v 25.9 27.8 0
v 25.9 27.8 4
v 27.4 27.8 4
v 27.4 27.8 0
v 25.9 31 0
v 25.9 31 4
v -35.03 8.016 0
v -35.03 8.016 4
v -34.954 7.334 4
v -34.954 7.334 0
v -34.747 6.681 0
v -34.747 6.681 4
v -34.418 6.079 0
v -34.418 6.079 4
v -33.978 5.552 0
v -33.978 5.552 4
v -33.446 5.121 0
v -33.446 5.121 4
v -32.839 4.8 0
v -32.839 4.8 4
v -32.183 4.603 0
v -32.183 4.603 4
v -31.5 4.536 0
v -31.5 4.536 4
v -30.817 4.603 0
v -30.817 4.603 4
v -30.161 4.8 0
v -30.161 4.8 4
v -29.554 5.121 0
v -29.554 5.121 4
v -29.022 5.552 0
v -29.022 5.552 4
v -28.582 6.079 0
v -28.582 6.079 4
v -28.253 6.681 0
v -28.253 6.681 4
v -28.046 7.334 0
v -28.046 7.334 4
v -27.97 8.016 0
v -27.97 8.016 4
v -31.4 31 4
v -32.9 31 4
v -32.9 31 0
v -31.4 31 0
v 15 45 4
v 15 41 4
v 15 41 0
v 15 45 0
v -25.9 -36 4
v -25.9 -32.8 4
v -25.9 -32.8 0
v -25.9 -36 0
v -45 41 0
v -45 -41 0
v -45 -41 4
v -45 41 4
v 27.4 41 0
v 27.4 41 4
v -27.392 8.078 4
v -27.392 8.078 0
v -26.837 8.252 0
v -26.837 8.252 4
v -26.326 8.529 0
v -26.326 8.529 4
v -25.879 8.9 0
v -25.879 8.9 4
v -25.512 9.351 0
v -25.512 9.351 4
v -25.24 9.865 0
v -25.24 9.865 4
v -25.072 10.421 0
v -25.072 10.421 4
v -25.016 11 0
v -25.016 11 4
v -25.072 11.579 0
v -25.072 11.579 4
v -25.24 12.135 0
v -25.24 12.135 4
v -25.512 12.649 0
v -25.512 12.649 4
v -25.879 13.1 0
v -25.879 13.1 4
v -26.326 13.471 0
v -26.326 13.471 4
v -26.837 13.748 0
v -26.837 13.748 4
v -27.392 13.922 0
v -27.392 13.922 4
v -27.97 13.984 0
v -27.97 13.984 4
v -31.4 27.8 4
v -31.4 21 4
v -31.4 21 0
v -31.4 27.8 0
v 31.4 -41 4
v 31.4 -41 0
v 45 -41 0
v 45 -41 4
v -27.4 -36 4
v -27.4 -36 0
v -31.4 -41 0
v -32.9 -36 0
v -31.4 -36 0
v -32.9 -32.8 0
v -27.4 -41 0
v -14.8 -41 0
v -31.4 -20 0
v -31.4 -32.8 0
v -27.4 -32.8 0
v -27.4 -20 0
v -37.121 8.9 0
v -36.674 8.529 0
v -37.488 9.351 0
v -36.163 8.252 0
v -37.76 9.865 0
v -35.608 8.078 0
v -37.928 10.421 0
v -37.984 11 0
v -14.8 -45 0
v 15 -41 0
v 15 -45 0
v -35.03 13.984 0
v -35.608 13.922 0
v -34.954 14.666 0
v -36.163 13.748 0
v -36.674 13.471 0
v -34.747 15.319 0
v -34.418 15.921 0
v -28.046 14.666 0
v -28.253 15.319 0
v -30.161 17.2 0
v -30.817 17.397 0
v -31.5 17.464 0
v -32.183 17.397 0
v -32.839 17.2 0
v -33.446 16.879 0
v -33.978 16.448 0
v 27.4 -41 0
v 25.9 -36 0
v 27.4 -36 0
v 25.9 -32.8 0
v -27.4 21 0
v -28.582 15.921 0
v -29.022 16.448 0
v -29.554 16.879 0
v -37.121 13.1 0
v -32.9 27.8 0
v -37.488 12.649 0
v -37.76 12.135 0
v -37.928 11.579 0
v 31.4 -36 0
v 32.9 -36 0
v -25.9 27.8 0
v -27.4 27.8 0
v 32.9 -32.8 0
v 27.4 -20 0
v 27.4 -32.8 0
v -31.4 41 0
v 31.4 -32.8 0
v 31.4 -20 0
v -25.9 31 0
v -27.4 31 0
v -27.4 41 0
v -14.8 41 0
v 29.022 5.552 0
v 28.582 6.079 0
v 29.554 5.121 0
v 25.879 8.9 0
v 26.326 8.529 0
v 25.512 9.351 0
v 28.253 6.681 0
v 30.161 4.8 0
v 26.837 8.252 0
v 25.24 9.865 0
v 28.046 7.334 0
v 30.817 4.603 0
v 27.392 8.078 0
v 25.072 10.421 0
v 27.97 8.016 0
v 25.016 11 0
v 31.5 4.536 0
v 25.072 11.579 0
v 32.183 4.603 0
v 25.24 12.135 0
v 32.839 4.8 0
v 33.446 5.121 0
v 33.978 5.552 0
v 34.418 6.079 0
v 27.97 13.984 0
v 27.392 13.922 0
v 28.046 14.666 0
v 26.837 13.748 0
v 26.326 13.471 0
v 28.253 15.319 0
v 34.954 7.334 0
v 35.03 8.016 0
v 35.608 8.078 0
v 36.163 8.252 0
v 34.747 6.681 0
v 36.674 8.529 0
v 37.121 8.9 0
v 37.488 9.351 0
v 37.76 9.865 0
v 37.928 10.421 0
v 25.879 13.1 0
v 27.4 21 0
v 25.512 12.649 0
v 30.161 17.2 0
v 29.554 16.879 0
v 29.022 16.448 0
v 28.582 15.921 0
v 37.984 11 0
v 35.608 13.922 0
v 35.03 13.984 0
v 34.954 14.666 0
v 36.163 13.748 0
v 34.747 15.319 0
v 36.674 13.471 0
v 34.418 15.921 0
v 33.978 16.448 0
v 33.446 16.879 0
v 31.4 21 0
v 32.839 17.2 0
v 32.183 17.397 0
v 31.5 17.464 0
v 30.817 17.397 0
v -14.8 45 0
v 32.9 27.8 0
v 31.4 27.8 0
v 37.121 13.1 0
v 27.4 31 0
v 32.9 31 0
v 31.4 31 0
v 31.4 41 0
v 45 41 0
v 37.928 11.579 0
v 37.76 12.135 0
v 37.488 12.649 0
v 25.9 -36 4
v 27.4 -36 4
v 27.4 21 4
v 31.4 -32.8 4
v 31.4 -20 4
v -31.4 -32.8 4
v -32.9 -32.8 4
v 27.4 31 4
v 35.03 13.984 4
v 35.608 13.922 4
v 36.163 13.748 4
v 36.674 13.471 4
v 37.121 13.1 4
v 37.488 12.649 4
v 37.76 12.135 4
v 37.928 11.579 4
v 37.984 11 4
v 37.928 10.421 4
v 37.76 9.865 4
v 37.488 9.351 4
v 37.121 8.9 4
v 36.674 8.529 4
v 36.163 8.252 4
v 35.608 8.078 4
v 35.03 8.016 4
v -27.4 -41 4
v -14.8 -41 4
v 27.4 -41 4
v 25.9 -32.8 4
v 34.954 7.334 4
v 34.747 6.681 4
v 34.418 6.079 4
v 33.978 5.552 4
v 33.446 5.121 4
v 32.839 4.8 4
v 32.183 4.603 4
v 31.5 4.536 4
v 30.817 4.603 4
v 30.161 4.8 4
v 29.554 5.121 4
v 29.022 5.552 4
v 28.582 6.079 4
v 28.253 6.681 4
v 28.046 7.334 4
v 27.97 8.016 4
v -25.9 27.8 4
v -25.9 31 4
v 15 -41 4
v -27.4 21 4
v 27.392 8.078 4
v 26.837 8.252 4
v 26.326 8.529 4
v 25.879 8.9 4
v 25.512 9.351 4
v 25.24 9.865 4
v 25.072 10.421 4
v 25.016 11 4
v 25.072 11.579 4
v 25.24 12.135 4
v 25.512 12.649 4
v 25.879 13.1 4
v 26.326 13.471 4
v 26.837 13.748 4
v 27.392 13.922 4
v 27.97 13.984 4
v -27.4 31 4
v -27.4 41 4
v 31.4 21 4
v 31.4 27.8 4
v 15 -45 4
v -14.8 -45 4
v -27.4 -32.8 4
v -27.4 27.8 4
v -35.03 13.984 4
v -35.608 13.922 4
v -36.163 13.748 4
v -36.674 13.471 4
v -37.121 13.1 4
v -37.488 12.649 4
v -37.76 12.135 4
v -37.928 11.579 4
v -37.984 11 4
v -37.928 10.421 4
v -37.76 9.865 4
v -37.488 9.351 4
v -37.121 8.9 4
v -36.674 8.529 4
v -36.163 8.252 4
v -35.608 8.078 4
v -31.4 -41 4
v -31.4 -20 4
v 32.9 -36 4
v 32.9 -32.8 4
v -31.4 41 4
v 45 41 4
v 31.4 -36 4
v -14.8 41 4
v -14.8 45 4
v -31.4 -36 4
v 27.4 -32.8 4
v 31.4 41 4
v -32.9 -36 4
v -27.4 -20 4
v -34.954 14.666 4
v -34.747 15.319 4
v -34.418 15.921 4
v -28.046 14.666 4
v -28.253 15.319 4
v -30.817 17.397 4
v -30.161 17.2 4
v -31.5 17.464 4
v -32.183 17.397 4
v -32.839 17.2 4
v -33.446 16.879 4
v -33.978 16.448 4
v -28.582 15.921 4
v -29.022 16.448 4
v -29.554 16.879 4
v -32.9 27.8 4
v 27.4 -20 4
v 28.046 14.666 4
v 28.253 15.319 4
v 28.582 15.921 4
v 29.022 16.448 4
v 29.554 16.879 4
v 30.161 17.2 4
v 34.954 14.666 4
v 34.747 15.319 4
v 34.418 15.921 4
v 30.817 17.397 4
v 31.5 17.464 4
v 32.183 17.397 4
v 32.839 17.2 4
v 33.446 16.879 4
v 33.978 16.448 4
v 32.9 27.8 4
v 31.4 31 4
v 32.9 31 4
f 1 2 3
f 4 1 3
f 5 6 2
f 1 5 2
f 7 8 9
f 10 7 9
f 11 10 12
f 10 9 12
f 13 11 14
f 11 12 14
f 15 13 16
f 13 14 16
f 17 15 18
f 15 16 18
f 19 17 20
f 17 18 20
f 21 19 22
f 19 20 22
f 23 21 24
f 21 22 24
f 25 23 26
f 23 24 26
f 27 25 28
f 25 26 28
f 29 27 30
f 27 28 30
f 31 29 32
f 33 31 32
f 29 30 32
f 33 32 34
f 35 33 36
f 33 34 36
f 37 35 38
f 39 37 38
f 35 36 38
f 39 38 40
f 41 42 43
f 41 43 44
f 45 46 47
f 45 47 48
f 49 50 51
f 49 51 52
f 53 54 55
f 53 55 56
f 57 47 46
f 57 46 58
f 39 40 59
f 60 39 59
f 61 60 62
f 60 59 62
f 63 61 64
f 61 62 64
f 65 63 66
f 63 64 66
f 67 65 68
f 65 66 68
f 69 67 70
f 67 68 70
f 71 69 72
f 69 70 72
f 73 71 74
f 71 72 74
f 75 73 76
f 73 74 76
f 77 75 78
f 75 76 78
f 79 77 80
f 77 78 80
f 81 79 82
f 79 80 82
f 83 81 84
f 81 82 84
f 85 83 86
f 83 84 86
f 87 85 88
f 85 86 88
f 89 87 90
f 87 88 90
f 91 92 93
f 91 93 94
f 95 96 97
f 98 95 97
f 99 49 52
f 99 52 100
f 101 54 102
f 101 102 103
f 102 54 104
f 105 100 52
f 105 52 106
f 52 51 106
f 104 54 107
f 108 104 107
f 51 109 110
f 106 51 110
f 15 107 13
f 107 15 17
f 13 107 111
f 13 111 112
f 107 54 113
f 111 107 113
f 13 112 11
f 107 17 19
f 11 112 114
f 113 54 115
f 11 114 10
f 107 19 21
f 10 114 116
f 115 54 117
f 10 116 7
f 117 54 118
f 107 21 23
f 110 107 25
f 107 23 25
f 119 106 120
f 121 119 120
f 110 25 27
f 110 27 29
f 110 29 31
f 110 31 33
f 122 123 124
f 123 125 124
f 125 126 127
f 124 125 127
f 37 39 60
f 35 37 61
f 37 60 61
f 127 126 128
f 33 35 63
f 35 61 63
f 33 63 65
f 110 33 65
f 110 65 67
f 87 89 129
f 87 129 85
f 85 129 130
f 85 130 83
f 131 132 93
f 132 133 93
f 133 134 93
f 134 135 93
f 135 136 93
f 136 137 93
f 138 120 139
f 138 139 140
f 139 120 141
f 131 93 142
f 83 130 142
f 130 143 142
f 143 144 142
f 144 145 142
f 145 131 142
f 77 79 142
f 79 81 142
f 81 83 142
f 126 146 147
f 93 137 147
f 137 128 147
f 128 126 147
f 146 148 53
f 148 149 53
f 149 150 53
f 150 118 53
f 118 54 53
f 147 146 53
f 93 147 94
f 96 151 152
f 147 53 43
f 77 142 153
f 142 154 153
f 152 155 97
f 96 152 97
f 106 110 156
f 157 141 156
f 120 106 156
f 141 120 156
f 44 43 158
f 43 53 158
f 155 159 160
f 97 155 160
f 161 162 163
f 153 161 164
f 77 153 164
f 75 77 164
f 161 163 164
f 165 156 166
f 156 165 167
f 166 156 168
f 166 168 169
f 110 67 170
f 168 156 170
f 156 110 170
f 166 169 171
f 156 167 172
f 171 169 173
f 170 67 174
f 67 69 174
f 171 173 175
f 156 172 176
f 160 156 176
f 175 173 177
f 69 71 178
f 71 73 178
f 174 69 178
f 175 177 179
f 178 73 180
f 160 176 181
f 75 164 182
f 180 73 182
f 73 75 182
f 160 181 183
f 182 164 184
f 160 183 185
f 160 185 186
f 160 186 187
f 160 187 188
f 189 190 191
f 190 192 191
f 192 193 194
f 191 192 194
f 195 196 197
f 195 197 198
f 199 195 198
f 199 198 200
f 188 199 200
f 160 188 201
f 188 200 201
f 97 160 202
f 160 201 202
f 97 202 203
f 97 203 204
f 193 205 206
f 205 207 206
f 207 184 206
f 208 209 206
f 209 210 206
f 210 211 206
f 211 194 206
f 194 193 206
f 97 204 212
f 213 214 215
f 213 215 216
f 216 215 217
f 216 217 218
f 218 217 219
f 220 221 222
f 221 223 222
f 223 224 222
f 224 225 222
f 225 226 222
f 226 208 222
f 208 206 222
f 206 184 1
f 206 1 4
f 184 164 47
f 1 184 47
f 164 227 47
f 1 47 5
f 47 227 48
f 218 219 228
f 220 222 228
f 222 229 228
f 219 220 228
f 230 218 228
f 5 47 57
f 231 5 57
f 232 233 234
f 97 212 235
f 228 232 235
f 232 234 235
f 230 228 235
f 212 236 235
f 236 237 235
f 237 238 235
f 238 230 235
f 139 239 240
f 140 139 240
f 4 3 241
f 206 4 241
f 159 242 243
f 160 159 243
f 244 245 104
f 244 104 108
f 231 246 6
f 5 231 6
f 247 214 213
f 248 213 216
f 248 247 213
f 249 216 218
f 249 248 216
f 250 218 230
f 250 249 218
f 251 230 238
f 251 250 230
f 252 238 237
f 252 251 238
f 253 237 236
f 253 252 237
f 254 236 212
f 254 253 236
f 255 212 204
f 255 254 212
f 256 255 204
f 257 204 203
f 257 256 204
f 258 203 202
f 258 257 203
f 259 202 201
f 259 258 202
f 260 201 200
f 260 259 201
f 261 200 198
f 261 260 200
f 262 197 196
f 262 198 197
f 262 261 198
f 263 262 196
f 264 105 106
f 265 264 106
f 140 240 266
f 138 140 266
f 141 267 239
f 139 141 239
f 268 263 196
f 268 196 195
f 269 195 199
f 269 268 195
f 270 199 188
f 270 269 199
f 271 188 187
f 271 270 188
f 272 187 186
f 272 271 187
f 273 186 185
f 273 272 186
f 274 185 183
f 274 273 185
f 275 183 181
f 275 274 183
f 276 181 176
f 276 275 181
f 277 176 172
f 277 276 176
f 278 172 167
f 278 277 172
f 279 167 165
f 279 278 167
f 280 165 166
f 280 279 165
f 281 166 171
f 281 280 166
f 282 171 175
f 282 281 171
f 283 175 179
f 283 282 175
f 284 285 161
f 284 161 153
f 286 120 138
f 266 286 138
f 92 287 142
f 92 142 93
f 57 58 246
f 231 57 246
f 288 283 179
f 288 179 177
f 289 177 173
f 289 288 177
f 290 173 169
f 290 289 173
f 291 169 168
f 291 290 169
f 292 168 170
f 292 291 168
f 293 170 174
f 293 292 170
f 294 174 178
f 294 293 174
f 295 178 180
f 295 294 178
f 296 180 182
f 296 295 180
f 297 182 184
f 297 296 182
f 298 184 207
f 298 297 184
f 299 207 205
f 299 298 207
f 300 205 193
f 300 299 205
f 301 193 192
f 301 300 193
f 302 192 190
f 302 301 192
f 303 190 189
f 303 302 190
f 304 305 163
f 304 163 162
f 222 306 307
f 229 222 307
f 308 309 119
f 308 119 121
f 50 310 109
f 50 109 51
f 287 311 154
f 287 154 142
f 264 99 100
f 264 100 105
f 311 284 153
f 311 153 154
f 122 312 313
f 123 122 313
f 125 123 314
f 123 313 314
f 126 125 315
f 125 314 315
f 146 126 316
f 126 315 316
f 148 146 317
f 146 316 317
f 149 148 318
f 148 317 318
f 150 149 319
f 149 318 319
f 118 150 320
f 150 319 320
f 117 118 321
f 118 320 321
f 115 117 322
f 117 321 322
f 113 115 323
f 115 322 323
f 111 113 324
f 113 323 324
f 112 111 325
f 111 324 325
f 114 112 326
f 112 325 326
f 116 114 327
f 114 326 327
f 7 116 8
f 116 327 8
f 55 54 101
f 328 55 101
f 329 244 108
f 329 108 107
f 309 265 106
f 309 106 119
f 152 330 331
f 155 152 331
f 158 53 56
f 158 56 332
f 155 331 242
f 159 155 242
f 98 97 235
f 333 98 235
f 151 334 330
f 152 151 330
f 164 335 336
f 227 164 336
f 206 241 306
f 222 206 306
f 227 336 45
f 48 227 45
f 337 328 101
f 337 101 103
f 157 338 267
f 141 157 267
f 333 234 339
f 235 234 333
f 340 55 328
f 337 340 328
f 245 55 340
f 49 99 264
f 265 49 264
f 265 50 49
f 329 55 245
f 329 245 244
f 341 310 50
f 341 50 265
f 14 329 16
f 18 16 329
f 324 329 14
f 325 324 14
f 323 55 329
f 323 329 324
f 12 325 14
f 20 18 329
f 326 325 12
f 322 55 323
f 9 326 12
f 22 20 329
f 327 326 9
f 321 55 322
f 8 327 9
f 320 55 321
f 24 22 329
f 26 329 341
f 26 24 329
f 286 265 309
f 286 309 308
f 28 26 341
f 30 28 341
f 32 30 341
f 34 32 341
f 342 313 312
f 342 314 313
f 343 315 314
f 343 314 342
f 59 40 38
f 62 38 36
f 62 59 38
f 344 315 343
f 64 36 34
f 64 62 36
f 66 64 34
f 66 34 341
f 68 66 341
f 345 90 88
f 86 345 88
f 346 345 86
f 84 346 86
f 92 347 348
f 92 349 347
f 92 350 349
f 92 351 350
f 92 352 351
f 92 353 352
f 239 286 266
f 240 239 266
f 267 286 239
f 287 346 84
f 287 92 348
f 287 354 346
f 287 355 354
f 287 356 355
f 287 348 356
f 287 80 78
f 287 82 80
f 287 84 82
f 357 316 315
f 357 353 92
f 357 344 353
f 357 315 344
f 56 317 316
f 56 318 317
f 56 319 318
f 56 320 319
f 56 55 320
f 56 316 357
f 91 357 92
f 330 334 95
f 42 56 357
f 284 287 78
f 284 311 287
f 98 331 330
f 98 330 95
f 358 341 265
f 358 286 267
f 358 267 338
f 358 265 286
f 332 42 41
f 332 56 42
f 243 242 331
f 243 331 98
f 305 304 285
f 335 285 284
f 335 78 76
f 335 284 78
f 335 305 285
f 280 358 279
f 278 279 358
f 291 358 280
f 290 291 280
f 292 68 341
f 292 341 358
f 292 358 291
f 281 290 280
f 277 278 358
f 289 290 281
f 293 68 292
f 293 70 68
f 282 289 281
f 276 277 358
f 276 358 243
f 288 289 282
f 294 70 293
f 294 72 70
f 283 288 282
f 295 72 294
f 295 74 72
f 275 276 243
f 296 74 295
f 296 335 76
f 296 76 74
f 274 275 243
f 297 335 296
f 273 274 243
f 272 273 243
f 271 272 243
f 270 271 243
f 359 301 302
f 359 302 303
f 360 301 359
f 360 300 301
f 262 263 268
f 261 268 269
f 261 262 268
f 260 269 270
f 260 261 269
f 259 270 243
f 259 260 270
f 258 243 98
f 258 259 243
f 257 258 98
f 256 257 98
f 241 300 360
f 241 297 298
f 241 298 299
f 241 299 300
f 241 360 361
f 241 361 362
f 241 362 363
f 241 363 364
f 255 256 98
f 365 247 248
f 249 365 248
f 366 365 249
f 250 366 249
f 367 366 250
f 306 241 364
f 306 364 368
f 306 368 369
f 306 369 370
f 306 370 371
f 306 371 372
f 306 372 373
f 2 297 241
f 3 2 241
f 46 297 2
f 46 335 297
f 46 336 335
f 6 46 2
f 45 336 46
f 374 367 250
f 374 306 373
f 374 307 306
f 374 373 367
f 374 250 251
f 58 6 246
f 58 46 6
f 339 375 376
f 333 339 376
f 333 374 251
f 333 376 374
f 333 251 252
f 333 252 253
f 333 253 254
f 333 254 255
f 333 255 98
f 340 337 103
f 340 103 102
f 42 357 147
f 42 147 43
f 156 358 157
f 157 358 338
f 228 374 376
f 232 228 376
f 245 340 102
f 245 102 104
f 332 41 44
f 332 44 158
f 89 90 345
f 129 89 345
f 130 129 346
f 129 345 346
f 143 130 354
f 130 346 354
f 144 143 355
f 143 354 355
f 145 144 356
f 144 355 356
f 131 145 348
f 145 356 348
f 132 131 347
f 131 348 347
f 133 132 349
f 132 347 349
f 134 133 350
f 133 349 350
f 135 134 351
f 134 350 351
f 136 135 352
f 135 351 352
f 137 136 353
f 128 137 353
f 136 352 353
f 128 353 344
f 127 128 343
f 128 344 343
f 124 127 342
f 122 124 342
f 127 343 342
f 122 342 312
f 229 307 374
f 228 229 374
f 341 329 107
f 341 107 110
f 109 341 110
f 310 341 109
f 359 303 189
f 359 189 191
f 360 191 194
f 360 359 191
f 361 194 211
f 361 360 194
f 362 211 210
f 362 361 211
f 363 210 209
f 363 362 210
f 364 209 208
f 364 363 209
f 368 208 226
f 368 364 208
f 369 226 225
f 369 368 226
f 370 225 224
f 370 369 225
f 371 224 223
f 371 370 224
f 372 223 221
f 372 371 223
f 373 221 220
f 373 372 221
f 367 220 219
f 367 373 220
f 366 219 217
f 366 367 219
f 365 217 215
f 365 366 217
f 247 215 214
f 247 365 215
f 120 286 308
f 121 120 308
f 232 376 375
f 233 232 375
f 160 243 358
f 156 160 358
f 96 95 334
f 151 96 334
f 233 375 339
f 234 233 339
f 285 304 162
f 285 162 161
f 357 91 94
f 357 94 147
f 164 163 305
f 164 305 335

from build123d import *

# Parameters (mm, degrees)
SKETCH1_W           = 90
SKETCH1_H           = 82
BOSS_EXTRUDE1_DEPTH = 4
SKETCH4_W           = 29.8
SKETCH4_H           = 4
BOSS_EXTRUDE2_DEPTH = 4
CUT_EXTRUDE1_DEPTH  = 10
CUT_EXTRUDE2_DEPTH  = 10


with BuildPart() as part:
    # Sketch1 → Boss-Extrude1 (new body)
    with BuildSketch(Plane.XY):
        Rectangle(SKETCH1_W, SKETCH1_H)
    extrude(amount=BOSS_EXTRUDE1_DEPTH)

    # Sketch4 → Boss-Extrude2 (add)
    with BuildSketch(Plane.XY.offset(4)):
        with Locations((0.1, 43)):
            Rectangle(SKETCH4_W, SKETCH4_H)
    boss_extrude2 = extrude(amount=-BOSS_EXTRUDE2_DEPTH)

    # Mirror1: Boss-Extrude2 across plane
    add(boss_extrude2.mirror(Plane(origin=(0, 0, 0), x_dir=(0, 0, 1), z_dir=(0, -1, 0))))

    # Sketch5 → Cut-Extrude1 (cut)
    with BuildSketch(Plane.XY.offset(4)):
        Polygon((27.39999999, 41), (27.39999999, 31), (25.89999999, 31), (25.89999999, 27.8), (27.39999999, 27.8), (27.39999999, 21), (31.39999999, 21), (31.39999999, 27.8), (32.89999999, 27.8), (32.89999999, 31), (31.39999999, 31), (31.39999999, 41), align=None)
        Polygon((-27.39999999, 27.8), (-27.39999999, 21), (-31.39999999, 21), (-31.39999999, 27.8), (-32.89999999, 27.8), (-32.89999999, 31), (-31.39999999, 31), (-31.39999999, 41), (-27.39999999, 41), (-27.39999999, 31), (-25.89999999, 31), (-25.89999999, 27.8), align=None)
        Polygon((-27.4, -36), (-27.4, -41), (-31.4, -41), (-31.4, -36), (-32.9, -36), (-32.9, -32.8), (-31.4, -32.8), (-31.4, -20), (-27.4, -20), (-27.4, -32.8), (-25.9, -32.8), (-25.9, -36), align=None)
        Polygon((31.4, -41), (31.4, -36), (32.9, -36), (32.9, -32.8), (31.4, -32.8), (31.4, -20), (27.4, -20), (27.4, -32.8), (25.9, -32.8), (25.9, -36), (27.4, -36), (27.4, -41), align=None)
    extrude(amount=-CUT_EXTRUDE1_DEPTH, mode=Mode.SUBTRACT)

    # Sketch6 → Cut-Extrude2 (cut)
    with BuildSketch(Plane.XY.offset(4)):
        with BuildLine():
            ThreePointArc((27.96981837, 8.015850853), (25.015698228, 11), (27.96981837, 13.984149147))
            ThreePointArc((27.96981837, 13.984149147), (31.5, 17.463580565), (35.03018163, 13.984149147))
            ThreePointArc((35.03018163, 13.984149147), (37.984301772, 11), (35.03018163, 8.015850853))
            ThreePointArc((35.03018163, 8.015850853), (31.5, 4.536419435), (27.96981837, 8.015850853))
        make_face()
        with BuildLine():
            ThreePointArc((-27.96981837, 13.984149147), (-31.5, 17.463580565), (-35.03018163, 13.984149147))
            ThreePointArc((-35.03018163, 13.984149147), (-37.984301772, 11), (-35.03018163, 8.015850853))
            ThreePointArc((-35.03018163, 8.015850853), (-31.5, 4.536419435), (-27.96981837, 8.015850853))
            ThreePointArc((-27.96981837, 8.015850853), (-25.015698228, 11), (-27.96981837, 13.984149147))
        make_face()
    extrude(amount=-CUT_EXTRUDE2_DEPTH, mode=Mode.SUBTRACT)


solid = part.part
